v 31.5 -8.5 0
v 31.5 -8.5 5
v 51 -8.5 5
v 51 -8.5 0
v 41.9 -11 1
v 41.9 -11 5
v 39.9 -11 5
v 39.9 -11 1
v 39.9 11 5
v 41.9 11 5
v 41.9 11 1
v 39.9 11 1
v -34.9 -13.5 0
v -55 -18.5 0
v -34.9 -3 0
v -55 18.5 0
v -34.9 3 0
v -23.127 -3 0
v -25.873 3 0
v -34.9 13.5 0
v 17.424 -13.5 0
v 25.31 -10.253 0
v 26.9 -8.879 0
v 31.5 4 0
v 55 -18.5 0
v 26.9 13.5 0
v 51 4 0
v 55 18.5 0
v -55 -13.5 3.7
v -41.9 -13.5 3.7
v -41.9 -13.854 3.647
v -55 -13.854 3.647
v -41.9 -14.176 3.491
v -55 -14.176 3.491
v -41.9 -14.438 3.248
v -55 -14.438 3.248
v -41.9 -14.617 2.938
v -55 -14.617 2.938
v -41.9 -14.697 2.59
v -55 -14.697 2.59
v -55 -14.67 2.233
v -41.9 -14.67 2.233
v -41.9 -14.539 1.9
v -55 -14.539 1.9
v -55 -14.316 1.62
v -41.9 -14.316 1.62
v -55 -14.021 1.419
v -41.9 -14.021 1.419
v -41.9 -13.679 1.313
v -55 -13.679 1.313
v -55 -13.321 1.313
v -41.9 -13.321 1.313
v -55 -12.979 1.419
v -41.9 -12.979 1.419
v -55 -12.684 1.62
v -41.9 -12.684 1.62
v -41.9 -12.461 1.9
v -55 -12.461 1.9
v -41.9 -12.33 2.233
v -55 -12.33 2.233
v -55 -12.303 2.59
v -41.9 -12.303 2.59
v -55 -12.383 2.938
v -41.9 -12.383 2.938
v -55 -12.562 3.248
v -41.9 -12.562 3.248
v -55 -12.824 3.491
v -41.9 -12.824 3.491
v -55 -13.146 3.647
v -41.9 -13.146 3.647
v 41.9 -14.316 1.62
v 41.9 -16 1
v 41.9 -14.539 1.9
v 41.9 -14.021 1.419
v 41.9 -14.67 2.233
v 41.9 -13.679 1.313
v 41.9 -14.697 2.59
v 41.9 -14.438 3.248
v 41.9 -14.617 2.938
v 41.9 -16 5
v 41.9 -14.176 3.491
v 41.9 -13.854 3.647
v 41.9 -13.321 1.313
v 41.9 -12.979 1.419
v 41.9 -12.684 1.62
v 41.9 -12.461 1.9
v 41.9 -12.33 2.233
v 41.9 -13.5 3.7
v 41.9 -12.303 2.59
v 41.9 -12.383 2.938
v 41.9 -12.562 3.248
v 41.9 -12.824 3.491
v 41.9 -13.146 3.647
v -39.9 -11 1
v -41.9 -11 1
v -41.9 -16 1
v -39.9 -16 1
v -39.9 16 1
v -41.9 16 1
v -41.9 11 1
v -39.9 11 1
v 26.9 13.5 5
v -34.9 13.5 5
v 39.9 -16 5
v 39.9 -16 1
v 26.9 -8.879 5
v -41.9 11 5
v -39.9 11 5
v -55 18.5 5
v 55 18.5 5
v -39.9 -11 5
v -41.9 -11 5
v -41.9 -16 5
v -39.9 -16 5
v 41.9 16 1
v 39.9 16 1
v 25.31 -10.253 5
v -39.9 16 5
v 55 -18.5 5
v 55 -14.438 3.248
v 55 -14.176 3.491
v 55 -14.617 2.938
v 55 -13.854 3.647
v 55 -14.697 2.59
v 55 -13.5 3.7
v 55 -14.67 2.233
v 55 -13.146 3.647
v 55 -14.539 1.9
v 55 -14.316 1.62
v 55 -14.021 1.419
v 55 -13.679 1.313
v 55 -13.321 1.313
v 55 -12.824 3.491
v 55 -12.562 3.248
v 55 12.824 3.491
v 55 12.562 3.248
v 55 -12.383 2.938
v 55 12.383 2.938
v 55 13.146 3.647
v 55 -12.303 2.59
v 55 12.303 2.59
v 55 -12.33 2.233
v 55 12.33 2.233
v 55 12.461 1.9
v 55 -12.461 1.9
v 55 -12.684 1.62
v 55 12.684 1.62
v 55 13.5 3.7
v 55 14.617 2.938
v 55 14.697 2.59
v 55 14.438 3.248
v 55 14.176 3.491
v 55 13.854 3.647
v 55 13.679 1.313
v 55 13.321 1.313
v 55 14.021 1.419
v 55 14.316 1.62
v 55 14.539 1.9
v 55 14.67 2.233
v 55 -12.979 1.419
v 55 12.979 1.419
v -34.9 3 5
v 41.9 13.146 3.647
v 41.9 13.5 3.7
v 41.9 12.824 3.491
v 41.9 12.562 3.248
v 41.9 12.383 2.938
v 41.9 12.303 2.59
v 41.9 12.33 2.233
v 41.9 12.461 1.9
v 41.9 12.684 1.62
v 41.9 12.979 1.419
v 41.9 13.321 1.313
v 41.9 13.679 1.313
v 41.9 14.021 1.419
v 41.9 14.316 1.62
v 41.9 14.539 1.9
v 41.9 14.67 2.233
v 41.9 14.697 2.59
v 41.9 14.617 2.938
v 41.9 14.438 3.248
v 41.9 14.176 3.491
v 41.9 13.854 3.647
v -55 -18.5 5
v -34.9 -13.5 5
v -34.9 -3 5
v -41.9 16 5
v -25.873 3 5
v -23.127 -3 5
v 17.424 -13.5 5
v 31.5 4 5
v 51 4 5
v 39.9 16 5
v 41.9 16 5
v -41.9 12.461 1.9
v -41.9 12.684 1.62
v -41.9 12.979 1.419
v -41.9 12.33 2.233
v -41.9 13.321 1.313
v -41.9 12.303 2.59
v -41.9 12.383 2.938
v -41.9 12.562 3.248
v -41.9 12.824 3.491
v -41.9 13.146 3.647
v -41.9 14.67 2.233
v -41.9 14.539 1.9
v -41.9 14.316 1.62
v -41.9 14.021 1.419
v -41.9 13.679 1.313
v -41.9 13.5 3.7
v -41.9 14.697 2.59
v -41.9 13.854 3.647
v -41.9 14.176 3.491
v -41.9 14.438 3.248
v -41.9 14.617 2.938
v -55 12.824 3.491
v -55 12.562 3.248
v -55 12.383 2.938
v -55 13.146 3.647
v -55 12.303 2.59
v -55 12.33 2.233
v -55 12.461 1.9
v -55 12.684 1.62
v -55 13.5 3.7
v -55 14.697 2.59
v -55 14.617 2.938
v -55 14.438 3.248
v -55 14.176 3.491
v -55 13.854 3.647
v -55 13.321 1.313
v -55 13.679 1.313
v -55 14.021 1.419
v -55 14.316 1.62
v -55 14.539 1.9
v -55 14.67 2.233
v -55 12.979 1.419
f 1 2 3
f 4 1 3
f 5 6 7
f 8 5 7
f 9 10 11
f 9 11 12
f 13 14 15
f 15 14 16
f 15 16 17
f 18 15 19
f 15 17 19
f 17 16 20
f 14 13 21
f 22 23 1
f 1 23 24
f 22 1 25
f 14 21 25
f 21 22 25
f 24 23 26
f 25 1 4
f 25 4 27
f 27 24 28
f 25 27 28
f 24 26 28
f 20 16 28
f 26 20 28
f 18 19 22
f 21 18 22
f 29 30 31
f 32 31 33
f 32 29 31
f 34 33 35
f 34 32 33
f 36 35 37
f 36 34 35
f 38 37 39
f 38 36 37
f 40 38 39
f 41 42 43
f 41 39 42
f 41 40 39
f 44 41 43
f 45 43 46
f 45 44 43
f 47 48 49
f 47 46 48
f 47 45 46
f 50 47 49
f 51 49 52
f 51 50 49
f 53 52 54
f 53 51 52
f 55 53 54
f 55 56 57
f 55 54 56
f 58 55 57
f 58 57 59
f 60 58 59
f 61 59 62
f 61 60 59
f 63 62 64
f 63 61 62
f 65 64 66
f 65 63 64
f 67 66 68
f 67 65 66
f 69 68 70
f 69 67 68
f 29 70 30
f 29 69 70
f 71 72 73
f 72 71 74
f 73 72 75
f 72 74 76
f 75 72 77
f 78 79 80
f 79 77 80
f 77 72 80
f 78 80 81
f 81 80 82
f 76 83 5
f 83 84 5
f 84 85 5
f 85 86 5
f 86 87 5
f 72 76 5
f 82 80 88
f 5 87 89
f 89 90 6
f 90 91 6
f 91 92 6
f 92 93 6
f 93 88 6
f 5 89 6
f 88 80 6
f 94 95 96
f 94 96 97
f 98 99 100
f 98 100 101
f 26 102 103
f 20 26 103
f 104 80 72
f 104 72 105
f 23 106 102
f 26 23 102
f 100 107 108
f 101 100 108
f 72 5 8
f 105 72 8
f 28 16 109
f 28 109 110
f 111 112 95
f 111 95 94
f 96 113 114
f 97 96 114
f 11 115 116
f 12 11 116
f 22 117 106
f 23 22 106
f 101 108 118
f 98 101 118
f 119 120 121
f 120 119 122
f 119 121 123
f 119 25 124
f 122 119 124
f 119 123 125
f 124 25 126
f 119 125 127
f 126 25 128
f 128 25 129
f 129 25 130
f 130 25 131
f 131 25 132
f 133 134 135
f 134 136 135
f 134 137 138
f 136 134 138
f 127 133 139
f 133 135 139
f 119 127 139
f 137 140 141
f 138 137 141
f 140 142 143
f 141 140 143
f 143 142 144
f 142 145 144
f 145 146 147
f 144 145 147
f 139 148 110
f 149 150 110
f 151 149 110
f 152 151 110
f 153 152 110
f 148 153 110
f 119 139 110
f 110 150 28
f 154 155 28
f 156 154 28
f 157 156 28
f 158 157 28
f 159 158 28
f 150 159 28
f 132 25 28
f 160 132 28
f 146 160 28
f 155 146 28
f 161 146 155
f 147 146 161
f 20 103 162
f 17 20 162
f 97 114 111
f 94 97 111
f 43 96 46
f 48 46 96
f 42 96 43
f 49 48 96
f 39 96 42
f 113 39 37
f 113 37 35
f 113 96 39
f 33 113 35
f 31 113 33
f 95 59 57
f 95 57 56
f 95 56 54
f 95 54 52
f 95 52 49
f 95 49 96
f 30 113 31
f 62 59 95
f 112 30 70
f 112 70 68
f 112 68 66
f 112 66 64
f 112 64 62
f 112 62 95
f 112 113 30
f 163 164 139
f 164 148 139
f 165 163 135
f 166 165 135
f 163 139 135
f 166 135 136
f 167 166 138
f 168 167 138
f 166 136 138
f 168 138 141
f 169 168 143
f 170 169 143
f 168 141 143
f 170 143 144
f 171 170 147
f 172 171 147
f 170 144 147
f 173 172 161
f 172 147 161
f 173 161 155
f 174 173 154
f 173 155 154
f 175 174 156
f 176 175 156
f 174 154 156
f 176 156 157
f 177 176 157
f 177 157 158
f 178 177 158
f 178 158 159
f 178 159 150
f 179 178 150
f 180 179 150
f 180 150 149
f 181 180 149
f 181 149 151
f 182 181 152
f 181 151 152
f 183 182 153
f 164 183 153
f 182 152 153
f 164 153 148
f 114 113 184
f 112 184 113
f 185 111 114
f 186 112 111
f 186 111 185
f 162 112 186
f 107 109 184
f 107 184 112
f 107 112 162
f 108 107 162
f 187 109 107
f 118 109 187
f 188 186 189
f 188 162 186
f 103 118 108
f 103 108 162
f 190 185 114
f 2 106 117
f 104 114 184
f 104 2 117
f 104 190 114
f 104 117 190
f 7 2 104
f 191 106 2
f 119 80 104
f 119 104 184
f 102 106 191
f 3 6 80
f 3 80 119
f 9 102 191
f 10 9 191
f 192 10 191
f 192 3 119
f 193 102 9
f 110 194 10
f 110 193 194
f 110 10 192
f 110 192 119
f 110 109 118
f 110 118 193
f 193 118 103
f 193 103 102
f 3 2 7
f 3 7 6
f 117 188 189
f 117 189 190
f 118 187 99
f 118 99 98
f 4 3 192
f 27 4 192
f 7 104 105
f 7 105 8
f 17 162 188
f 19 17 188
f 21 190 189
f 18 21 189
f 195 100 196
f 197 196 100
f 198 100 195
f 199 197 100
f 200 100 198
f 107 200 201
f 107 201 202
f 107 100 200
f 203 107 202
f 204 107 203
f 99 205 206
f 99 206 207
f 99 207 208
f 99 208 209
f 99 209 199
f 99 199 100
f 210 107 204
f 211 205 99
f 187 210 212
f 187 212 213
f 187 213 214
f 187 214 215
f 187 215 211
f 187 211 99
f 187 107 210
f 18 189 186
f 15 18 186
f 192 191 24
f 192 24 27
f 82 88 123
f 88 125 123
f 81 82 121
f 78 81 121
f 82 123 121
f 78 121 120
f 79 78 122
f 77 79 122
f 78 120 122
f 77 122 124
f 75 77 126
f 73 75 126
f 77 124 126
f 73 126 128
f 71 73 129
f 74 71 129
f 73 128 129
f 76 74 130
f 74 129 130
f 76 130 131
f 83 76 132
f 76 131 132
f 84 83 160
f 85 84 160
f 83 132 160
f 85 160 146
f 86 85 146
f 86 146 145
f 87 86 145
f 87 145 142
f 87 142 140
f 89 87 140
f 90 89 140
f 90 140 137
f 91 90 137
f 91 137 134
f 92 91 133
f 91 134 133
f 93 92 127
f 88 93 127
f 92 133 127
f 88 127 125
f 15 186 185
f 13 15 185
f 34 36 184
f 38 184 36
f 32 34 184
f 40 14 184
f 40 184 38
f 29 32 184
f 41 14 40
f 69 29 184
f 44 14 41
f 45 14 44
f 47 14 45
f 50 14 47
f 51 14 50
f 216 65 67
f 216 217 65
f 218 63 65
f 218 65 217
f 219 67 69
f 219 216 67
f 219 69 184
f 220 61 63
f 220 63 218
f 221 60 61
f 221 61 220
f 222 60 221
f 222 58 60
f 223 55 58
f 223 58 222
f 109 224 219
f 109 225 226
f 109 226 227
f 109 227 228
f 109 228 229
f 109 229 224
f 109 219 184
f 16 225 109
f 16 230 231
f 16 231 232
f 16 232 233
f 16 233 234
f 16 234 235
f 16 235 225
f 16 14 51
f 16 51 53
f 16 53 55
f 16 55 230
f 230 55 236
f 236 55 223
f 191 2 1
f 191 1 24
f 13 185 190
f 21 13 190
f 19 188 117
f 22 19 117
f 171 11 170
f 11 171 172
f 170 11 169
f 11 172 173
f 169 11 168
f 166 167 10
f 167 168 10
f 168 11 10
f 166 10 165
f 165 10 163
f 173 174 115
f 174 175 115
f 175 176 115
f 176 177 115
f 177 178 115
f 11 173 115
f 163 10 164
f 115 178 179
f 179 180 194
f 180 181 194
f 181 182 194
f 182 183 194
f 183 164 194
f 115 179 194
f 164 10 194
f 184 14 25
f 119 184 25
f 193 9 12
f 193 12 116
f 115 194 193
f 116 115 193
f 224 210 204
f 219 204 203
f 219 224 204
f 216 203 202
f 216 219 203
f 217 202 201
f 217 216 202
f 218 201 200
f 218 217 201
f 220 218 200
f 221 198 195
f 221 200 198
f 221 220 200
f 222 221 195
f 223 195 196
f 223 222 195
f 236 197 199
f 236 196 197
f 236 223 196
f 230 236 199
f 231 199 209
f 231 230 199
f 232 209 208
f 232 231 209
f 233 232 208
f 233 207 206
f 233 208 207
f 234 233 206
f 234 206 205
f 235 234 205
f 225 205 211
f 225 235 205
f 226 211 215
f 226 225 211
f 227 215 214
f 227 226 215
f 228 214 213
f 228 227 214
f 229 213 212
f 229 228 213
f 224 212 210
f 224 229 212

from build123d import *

# Parameters (mm, degrees)
SKETCH1_W                     = 110
SKETCH1_H                     = 37
BOSS_EXTRUDE1_DEPTH           = 5
M2_CLEARANCE_HOLE1_AT_2_COUNT = 2
M2_CLEARANCE_HOLE1_AT_2_PITCH = 27
SKETCH5_W                     = 2
SKETCH5_H                     = 5
CUT_EXTRUDE1_DEPTH            = 4
SKETCH6_W                     = 19.5
SKETCH6_H                     = 12.5
CUT_EXTRUDE2_DEPTH            = 10
CUT_EXTRUDE3_DEPTH            = 59.243025334


with BuildPart() as part:
    # Sketch1 → Boss-Extrude1 (new body)
    with BuildSketch(Plane.XY):
        Rectangle(SKETCH1_W, SKETCH1_H)
    extrude(amount=BOSS_EXTRUDE1_DEPTH)

    # Sketch4 → M2 Clearance Hole1 (revolve, cut)
    with BuildSketch(Plane(origin=(-55, 13.5, 2.5), x_dir=(0, 0, 1), z_dir=(0, 1, 0))):
        Polygon((0, 0), (0, 14.721032743), (1.2, 14), (1.2, 0), align=None)
    m2_clearance_hole1 = revolve(axis=Axis((-61.35, 13.5, 2.5), (1, 0, 0)), mode=Mode.SUBTRACT)

    # M2 Clearance Hole1 at 2: M2 Clearance Hole1 ×2
    with Locations(*[(0, -i * M2_CLEARANCE_HOLE1_AT_2_PITCH, 0) for i in range(1, M2_CLEARANCE_HOLE1_AT_2_COUNT)]):
        add(m2_clearance_hole1, mode=Mode.SUBTRACT)

    # Sketch5 → Cut-Extrude1 (cut)
    with BuildSketch(Plane.XY.offset(5)):
        with Locations((-40.9, 13.5)):
            Rectangle(SKETCH5_W, SKETCH5_H)
        with Locations((-40.9, -13.5)):
            Rectangle(SKETCH5_W, SKETCH5_H)
    cut_extrude1 = extrude(amount=-CUT_EXTRUDE1_DEPTH, mode=Mode.SUBTRACT)

    # Mirror1: M2 Clearance Hole1, Cut-Extrude1 across plane
    add(m2_clearance_hole1.mirror(Plane(origin=(0, 0, 0), x_dir=(0, 0, 1), z_dir=(1, 0, 0))), mode=Mode.SUBTRACT)
    add(cut_extrude1.mirror(Plane(origin=(0, 0, 0), x_dir=(0, 0, 1), z_dir=(1, 0, 0))), mode=Mode.SUBTRACT)

    # Mirror1 copy 1 sketch → Mirror1 copy 1 (revolve, cut)
    with BuildSketch(Plane(origin=(55, -13.5, 2.5), x_dir=(0, 0, 1), z_dir=(0, 1, 0))):
        Polygon((0, 0), (0, -14.721032743), (1.2, -14), (1.2, 0), align=None)
    revolve(axis=Axis((61.35, -13.5, 2.5), (1, 0, 0)), mode=Mode.SUBTRACT)

    # Sketch6 → Cut-Extrude2 (cut)
    with BuildSketch(Plane.XY.offset(5)):
        with Locations((41.25, -2.25)):
            Rectangle(SKETCH6_W, SKETCH6_H)
    extrude(amount=-CUT_EXTRUDE2_DEPTH, mode=Mode.SUBTRACT)

    # Sketch7 → Cut-Extrude3 (cut, through all)
    with BuildSketch(Plane.XY.offset(5)):
        Polygon((-34.9, -3), (-34.9, -13.5), (17.424359974, -13.5), (-23.127364164, -3), align=None)
        Polygon((-34.9, 13.5), (-34.9, 3), (-25.872635836, 3), (25.310097731, -10.252672084), (26.9, -8.878654338), (26.9, 13.5), align=None)
    extrude(amount=-CUT_EXTRUDE3_DEPTH, mode=Mode.SUBTRACT)


solid = part.part
